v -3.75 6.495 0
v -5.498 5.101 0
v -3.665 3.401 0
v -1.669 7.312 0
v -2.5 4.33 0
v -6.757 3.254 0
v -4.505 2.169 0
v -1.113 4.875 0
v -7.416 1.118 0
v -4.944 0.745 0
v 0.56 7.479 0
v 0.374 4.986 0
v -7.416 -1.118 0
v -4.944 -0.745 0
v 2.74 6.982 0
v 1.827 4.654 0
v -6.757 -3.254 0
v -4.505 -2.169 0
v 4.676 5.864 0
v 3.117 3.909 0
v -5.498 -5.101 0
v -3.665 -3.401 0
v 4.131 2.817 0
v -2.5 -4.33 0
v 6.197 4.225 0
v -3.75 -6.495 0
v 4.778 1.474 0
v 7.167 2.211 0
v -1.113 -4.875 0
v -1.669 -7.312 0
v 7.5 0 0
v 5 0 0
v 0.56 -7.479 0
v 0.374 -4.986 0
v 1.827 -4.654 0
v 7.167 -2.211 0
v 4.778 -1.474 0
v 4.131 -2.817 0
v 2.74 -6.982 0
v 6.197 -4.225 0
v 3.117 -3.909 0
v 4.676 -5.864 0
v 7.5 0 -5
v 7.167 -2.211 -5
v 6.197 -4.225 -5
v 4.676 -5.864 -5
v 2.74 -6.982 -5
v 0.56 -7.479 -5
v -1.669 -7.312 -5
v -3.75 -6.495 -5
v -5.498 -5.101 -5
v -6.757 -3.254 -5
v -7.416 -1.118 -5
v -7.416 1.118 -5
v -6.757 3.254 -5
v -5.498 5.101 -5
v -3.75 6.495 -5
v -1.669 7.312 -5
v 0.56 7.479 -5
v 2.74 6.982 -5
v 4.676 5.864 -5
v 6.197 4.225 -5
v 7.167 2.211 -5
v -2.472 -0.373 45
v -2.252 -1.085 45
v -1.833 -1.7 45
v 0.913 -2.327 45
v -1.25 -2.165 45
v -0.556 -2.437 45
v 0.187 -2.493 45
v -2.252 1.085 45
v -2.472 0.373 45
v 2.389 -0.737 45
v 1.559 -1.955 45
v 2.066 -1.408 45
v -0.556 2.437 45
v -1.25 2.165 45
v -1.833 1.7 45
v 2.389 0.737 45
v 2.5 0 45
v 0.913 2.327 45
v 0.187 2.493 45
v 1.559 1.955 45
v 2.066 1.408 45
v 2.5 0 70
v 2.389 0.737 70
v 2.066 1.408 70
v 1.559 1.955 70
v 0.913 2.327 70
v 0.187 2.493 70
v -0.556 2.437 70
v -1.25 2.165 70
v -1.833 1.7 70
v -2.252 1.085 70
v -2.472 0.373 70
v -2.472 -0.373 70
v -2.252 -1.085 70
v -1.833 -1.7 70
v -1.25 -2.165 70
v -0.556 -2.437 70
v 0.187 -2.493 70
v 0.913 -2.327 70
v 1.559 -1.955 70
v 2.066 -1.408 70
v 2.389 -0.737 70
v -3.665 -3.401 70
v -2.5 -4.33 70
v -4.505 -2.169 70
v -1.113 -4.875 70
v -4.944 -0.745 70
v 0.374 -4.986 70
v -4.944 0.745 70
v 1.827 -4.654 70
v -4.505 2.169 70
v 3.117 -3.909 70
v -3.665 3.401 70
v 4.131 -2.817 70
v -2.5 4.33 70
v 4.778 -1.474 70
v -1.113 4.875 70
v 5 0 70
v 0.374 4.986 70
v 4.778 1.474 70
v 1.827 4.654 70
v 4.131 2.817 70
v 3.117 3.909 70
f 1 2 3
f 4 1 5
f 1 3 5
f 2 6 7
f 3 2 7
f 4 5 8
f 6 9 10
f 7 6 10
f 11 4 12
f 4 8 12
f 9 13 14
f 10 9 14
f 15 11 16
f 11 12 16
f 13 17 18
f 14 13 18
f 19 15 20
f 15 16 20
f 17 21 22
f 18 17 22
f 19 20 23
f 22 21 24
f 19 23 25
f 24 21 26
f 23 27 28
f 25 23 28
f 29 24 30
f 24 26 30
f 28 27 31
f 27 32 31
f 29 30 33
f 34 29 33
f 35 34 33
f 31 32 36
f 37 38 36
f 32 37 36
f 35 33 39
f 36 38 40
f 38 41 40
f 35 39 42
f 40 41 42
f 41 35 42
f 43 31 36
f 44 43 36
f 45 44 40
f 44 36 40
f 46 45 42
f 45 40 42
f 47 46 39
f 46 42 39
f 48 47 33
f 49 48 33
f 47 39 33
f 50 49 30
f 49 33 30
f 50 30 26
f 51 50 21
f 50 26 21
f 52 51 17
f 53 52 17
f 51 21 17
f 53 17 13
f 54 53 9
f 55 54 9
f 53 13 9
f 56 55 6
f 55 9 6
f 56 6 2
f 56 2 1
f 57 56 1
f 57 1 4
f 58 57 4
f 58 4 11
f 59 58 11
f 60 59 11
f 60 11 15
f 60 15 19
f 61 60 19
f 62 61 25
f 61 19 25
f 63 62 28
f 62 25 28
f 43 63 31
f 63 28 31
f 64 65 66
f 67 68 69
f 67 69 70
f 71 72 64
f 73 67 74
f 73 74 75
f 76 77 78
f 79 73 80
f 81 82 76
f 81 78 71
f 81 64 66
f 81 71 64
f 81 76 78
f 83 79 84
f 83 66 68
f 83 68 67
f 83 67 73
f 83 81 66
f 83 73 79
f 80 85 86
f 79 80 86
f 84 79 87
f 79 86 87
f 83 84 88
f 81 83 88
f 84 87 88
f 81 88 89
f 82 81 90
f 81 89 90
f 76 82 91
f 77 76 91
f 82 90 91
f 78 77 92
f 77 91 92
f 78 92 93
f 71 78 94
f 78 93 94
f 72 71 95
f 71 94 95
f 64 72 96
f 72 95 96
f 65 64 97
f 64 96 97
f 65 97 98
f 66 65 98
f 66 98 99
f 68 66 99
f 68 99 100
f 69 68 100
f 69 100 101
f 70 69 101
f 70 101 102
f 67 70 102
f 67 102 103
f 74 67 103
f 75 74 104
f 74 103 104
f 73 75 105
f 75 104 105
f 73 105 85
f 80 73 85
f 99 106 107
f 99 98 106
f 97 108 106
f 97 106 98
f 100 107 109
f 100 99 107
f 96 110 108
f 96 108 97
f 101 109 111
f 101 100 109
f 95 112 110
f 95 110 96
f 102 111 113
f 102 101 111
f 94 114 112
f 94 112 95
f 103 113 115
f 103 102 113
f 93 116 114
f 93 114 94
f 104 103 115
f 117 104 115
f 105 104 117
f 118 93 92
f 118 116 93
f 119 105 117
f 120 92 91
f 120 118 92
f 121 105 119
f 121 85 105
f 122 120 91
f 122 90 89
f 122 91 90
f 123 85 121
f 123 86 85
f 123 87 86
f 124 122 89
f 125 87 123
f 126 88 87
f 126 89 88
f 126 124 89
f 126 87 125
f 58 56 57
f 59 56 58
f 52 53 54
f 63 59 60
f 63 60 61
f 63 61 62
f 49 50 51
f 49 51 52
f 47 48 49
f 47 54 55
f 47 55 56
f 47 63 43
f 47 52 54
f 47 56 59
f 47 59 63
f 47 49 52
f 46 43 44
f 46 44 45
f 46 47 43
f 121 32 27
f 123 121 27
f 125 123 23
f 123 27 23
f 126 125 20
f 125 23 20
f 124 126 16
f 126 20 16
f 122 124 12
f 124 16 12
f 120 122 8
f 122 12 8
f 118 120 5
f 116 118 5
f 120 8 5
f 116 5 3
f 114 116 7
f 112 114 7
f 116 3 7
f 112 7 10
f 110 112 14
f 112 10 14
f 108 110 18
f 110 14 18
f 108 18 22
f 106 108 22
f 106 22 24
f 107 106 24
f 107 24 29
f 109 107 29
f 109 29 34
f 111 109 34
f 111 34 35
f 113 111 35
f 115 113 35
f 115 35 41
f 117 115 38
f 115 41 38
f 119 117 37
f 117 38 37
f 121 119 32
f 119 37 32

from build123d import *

# Parameters (mm, degrees)
F0_R     = 5
F1_DEPTH = 70
F2_R     = 7.5
F2_R_2   = 5
F3_DEPTH = 5
F4_R     = 2.5
F5_DEPTH = 25


with BuildPart() as f1:
    # F0 (on Top) → F1 (new body)
    with BuildSketch(Plane.XY):
        Circle(F0_R)
    extrude(amount=F1_DEPTH)

    # F2 (on face) → F3 (join)
    with BuildSketch(Plane(origin=(0, 0, 0), x_dir=(1, 0, 0), z_dir=(0, 0, -1))):
        Circle(F2_R)
        Circle(F2_R_2, mode=Mode.SUBTRACT)
        Circle(F2_R_2)
    extrude(amount=F3_DEPTH)

    # F4 (on face) → F5 (cut)
    with BuildSketch(Plane.XY.offset(70)):
        Circle(F4_R)
    extrude(amount=-F5_DEPTH, mode=Mode.SUBTRACT)


solid = f1.part
